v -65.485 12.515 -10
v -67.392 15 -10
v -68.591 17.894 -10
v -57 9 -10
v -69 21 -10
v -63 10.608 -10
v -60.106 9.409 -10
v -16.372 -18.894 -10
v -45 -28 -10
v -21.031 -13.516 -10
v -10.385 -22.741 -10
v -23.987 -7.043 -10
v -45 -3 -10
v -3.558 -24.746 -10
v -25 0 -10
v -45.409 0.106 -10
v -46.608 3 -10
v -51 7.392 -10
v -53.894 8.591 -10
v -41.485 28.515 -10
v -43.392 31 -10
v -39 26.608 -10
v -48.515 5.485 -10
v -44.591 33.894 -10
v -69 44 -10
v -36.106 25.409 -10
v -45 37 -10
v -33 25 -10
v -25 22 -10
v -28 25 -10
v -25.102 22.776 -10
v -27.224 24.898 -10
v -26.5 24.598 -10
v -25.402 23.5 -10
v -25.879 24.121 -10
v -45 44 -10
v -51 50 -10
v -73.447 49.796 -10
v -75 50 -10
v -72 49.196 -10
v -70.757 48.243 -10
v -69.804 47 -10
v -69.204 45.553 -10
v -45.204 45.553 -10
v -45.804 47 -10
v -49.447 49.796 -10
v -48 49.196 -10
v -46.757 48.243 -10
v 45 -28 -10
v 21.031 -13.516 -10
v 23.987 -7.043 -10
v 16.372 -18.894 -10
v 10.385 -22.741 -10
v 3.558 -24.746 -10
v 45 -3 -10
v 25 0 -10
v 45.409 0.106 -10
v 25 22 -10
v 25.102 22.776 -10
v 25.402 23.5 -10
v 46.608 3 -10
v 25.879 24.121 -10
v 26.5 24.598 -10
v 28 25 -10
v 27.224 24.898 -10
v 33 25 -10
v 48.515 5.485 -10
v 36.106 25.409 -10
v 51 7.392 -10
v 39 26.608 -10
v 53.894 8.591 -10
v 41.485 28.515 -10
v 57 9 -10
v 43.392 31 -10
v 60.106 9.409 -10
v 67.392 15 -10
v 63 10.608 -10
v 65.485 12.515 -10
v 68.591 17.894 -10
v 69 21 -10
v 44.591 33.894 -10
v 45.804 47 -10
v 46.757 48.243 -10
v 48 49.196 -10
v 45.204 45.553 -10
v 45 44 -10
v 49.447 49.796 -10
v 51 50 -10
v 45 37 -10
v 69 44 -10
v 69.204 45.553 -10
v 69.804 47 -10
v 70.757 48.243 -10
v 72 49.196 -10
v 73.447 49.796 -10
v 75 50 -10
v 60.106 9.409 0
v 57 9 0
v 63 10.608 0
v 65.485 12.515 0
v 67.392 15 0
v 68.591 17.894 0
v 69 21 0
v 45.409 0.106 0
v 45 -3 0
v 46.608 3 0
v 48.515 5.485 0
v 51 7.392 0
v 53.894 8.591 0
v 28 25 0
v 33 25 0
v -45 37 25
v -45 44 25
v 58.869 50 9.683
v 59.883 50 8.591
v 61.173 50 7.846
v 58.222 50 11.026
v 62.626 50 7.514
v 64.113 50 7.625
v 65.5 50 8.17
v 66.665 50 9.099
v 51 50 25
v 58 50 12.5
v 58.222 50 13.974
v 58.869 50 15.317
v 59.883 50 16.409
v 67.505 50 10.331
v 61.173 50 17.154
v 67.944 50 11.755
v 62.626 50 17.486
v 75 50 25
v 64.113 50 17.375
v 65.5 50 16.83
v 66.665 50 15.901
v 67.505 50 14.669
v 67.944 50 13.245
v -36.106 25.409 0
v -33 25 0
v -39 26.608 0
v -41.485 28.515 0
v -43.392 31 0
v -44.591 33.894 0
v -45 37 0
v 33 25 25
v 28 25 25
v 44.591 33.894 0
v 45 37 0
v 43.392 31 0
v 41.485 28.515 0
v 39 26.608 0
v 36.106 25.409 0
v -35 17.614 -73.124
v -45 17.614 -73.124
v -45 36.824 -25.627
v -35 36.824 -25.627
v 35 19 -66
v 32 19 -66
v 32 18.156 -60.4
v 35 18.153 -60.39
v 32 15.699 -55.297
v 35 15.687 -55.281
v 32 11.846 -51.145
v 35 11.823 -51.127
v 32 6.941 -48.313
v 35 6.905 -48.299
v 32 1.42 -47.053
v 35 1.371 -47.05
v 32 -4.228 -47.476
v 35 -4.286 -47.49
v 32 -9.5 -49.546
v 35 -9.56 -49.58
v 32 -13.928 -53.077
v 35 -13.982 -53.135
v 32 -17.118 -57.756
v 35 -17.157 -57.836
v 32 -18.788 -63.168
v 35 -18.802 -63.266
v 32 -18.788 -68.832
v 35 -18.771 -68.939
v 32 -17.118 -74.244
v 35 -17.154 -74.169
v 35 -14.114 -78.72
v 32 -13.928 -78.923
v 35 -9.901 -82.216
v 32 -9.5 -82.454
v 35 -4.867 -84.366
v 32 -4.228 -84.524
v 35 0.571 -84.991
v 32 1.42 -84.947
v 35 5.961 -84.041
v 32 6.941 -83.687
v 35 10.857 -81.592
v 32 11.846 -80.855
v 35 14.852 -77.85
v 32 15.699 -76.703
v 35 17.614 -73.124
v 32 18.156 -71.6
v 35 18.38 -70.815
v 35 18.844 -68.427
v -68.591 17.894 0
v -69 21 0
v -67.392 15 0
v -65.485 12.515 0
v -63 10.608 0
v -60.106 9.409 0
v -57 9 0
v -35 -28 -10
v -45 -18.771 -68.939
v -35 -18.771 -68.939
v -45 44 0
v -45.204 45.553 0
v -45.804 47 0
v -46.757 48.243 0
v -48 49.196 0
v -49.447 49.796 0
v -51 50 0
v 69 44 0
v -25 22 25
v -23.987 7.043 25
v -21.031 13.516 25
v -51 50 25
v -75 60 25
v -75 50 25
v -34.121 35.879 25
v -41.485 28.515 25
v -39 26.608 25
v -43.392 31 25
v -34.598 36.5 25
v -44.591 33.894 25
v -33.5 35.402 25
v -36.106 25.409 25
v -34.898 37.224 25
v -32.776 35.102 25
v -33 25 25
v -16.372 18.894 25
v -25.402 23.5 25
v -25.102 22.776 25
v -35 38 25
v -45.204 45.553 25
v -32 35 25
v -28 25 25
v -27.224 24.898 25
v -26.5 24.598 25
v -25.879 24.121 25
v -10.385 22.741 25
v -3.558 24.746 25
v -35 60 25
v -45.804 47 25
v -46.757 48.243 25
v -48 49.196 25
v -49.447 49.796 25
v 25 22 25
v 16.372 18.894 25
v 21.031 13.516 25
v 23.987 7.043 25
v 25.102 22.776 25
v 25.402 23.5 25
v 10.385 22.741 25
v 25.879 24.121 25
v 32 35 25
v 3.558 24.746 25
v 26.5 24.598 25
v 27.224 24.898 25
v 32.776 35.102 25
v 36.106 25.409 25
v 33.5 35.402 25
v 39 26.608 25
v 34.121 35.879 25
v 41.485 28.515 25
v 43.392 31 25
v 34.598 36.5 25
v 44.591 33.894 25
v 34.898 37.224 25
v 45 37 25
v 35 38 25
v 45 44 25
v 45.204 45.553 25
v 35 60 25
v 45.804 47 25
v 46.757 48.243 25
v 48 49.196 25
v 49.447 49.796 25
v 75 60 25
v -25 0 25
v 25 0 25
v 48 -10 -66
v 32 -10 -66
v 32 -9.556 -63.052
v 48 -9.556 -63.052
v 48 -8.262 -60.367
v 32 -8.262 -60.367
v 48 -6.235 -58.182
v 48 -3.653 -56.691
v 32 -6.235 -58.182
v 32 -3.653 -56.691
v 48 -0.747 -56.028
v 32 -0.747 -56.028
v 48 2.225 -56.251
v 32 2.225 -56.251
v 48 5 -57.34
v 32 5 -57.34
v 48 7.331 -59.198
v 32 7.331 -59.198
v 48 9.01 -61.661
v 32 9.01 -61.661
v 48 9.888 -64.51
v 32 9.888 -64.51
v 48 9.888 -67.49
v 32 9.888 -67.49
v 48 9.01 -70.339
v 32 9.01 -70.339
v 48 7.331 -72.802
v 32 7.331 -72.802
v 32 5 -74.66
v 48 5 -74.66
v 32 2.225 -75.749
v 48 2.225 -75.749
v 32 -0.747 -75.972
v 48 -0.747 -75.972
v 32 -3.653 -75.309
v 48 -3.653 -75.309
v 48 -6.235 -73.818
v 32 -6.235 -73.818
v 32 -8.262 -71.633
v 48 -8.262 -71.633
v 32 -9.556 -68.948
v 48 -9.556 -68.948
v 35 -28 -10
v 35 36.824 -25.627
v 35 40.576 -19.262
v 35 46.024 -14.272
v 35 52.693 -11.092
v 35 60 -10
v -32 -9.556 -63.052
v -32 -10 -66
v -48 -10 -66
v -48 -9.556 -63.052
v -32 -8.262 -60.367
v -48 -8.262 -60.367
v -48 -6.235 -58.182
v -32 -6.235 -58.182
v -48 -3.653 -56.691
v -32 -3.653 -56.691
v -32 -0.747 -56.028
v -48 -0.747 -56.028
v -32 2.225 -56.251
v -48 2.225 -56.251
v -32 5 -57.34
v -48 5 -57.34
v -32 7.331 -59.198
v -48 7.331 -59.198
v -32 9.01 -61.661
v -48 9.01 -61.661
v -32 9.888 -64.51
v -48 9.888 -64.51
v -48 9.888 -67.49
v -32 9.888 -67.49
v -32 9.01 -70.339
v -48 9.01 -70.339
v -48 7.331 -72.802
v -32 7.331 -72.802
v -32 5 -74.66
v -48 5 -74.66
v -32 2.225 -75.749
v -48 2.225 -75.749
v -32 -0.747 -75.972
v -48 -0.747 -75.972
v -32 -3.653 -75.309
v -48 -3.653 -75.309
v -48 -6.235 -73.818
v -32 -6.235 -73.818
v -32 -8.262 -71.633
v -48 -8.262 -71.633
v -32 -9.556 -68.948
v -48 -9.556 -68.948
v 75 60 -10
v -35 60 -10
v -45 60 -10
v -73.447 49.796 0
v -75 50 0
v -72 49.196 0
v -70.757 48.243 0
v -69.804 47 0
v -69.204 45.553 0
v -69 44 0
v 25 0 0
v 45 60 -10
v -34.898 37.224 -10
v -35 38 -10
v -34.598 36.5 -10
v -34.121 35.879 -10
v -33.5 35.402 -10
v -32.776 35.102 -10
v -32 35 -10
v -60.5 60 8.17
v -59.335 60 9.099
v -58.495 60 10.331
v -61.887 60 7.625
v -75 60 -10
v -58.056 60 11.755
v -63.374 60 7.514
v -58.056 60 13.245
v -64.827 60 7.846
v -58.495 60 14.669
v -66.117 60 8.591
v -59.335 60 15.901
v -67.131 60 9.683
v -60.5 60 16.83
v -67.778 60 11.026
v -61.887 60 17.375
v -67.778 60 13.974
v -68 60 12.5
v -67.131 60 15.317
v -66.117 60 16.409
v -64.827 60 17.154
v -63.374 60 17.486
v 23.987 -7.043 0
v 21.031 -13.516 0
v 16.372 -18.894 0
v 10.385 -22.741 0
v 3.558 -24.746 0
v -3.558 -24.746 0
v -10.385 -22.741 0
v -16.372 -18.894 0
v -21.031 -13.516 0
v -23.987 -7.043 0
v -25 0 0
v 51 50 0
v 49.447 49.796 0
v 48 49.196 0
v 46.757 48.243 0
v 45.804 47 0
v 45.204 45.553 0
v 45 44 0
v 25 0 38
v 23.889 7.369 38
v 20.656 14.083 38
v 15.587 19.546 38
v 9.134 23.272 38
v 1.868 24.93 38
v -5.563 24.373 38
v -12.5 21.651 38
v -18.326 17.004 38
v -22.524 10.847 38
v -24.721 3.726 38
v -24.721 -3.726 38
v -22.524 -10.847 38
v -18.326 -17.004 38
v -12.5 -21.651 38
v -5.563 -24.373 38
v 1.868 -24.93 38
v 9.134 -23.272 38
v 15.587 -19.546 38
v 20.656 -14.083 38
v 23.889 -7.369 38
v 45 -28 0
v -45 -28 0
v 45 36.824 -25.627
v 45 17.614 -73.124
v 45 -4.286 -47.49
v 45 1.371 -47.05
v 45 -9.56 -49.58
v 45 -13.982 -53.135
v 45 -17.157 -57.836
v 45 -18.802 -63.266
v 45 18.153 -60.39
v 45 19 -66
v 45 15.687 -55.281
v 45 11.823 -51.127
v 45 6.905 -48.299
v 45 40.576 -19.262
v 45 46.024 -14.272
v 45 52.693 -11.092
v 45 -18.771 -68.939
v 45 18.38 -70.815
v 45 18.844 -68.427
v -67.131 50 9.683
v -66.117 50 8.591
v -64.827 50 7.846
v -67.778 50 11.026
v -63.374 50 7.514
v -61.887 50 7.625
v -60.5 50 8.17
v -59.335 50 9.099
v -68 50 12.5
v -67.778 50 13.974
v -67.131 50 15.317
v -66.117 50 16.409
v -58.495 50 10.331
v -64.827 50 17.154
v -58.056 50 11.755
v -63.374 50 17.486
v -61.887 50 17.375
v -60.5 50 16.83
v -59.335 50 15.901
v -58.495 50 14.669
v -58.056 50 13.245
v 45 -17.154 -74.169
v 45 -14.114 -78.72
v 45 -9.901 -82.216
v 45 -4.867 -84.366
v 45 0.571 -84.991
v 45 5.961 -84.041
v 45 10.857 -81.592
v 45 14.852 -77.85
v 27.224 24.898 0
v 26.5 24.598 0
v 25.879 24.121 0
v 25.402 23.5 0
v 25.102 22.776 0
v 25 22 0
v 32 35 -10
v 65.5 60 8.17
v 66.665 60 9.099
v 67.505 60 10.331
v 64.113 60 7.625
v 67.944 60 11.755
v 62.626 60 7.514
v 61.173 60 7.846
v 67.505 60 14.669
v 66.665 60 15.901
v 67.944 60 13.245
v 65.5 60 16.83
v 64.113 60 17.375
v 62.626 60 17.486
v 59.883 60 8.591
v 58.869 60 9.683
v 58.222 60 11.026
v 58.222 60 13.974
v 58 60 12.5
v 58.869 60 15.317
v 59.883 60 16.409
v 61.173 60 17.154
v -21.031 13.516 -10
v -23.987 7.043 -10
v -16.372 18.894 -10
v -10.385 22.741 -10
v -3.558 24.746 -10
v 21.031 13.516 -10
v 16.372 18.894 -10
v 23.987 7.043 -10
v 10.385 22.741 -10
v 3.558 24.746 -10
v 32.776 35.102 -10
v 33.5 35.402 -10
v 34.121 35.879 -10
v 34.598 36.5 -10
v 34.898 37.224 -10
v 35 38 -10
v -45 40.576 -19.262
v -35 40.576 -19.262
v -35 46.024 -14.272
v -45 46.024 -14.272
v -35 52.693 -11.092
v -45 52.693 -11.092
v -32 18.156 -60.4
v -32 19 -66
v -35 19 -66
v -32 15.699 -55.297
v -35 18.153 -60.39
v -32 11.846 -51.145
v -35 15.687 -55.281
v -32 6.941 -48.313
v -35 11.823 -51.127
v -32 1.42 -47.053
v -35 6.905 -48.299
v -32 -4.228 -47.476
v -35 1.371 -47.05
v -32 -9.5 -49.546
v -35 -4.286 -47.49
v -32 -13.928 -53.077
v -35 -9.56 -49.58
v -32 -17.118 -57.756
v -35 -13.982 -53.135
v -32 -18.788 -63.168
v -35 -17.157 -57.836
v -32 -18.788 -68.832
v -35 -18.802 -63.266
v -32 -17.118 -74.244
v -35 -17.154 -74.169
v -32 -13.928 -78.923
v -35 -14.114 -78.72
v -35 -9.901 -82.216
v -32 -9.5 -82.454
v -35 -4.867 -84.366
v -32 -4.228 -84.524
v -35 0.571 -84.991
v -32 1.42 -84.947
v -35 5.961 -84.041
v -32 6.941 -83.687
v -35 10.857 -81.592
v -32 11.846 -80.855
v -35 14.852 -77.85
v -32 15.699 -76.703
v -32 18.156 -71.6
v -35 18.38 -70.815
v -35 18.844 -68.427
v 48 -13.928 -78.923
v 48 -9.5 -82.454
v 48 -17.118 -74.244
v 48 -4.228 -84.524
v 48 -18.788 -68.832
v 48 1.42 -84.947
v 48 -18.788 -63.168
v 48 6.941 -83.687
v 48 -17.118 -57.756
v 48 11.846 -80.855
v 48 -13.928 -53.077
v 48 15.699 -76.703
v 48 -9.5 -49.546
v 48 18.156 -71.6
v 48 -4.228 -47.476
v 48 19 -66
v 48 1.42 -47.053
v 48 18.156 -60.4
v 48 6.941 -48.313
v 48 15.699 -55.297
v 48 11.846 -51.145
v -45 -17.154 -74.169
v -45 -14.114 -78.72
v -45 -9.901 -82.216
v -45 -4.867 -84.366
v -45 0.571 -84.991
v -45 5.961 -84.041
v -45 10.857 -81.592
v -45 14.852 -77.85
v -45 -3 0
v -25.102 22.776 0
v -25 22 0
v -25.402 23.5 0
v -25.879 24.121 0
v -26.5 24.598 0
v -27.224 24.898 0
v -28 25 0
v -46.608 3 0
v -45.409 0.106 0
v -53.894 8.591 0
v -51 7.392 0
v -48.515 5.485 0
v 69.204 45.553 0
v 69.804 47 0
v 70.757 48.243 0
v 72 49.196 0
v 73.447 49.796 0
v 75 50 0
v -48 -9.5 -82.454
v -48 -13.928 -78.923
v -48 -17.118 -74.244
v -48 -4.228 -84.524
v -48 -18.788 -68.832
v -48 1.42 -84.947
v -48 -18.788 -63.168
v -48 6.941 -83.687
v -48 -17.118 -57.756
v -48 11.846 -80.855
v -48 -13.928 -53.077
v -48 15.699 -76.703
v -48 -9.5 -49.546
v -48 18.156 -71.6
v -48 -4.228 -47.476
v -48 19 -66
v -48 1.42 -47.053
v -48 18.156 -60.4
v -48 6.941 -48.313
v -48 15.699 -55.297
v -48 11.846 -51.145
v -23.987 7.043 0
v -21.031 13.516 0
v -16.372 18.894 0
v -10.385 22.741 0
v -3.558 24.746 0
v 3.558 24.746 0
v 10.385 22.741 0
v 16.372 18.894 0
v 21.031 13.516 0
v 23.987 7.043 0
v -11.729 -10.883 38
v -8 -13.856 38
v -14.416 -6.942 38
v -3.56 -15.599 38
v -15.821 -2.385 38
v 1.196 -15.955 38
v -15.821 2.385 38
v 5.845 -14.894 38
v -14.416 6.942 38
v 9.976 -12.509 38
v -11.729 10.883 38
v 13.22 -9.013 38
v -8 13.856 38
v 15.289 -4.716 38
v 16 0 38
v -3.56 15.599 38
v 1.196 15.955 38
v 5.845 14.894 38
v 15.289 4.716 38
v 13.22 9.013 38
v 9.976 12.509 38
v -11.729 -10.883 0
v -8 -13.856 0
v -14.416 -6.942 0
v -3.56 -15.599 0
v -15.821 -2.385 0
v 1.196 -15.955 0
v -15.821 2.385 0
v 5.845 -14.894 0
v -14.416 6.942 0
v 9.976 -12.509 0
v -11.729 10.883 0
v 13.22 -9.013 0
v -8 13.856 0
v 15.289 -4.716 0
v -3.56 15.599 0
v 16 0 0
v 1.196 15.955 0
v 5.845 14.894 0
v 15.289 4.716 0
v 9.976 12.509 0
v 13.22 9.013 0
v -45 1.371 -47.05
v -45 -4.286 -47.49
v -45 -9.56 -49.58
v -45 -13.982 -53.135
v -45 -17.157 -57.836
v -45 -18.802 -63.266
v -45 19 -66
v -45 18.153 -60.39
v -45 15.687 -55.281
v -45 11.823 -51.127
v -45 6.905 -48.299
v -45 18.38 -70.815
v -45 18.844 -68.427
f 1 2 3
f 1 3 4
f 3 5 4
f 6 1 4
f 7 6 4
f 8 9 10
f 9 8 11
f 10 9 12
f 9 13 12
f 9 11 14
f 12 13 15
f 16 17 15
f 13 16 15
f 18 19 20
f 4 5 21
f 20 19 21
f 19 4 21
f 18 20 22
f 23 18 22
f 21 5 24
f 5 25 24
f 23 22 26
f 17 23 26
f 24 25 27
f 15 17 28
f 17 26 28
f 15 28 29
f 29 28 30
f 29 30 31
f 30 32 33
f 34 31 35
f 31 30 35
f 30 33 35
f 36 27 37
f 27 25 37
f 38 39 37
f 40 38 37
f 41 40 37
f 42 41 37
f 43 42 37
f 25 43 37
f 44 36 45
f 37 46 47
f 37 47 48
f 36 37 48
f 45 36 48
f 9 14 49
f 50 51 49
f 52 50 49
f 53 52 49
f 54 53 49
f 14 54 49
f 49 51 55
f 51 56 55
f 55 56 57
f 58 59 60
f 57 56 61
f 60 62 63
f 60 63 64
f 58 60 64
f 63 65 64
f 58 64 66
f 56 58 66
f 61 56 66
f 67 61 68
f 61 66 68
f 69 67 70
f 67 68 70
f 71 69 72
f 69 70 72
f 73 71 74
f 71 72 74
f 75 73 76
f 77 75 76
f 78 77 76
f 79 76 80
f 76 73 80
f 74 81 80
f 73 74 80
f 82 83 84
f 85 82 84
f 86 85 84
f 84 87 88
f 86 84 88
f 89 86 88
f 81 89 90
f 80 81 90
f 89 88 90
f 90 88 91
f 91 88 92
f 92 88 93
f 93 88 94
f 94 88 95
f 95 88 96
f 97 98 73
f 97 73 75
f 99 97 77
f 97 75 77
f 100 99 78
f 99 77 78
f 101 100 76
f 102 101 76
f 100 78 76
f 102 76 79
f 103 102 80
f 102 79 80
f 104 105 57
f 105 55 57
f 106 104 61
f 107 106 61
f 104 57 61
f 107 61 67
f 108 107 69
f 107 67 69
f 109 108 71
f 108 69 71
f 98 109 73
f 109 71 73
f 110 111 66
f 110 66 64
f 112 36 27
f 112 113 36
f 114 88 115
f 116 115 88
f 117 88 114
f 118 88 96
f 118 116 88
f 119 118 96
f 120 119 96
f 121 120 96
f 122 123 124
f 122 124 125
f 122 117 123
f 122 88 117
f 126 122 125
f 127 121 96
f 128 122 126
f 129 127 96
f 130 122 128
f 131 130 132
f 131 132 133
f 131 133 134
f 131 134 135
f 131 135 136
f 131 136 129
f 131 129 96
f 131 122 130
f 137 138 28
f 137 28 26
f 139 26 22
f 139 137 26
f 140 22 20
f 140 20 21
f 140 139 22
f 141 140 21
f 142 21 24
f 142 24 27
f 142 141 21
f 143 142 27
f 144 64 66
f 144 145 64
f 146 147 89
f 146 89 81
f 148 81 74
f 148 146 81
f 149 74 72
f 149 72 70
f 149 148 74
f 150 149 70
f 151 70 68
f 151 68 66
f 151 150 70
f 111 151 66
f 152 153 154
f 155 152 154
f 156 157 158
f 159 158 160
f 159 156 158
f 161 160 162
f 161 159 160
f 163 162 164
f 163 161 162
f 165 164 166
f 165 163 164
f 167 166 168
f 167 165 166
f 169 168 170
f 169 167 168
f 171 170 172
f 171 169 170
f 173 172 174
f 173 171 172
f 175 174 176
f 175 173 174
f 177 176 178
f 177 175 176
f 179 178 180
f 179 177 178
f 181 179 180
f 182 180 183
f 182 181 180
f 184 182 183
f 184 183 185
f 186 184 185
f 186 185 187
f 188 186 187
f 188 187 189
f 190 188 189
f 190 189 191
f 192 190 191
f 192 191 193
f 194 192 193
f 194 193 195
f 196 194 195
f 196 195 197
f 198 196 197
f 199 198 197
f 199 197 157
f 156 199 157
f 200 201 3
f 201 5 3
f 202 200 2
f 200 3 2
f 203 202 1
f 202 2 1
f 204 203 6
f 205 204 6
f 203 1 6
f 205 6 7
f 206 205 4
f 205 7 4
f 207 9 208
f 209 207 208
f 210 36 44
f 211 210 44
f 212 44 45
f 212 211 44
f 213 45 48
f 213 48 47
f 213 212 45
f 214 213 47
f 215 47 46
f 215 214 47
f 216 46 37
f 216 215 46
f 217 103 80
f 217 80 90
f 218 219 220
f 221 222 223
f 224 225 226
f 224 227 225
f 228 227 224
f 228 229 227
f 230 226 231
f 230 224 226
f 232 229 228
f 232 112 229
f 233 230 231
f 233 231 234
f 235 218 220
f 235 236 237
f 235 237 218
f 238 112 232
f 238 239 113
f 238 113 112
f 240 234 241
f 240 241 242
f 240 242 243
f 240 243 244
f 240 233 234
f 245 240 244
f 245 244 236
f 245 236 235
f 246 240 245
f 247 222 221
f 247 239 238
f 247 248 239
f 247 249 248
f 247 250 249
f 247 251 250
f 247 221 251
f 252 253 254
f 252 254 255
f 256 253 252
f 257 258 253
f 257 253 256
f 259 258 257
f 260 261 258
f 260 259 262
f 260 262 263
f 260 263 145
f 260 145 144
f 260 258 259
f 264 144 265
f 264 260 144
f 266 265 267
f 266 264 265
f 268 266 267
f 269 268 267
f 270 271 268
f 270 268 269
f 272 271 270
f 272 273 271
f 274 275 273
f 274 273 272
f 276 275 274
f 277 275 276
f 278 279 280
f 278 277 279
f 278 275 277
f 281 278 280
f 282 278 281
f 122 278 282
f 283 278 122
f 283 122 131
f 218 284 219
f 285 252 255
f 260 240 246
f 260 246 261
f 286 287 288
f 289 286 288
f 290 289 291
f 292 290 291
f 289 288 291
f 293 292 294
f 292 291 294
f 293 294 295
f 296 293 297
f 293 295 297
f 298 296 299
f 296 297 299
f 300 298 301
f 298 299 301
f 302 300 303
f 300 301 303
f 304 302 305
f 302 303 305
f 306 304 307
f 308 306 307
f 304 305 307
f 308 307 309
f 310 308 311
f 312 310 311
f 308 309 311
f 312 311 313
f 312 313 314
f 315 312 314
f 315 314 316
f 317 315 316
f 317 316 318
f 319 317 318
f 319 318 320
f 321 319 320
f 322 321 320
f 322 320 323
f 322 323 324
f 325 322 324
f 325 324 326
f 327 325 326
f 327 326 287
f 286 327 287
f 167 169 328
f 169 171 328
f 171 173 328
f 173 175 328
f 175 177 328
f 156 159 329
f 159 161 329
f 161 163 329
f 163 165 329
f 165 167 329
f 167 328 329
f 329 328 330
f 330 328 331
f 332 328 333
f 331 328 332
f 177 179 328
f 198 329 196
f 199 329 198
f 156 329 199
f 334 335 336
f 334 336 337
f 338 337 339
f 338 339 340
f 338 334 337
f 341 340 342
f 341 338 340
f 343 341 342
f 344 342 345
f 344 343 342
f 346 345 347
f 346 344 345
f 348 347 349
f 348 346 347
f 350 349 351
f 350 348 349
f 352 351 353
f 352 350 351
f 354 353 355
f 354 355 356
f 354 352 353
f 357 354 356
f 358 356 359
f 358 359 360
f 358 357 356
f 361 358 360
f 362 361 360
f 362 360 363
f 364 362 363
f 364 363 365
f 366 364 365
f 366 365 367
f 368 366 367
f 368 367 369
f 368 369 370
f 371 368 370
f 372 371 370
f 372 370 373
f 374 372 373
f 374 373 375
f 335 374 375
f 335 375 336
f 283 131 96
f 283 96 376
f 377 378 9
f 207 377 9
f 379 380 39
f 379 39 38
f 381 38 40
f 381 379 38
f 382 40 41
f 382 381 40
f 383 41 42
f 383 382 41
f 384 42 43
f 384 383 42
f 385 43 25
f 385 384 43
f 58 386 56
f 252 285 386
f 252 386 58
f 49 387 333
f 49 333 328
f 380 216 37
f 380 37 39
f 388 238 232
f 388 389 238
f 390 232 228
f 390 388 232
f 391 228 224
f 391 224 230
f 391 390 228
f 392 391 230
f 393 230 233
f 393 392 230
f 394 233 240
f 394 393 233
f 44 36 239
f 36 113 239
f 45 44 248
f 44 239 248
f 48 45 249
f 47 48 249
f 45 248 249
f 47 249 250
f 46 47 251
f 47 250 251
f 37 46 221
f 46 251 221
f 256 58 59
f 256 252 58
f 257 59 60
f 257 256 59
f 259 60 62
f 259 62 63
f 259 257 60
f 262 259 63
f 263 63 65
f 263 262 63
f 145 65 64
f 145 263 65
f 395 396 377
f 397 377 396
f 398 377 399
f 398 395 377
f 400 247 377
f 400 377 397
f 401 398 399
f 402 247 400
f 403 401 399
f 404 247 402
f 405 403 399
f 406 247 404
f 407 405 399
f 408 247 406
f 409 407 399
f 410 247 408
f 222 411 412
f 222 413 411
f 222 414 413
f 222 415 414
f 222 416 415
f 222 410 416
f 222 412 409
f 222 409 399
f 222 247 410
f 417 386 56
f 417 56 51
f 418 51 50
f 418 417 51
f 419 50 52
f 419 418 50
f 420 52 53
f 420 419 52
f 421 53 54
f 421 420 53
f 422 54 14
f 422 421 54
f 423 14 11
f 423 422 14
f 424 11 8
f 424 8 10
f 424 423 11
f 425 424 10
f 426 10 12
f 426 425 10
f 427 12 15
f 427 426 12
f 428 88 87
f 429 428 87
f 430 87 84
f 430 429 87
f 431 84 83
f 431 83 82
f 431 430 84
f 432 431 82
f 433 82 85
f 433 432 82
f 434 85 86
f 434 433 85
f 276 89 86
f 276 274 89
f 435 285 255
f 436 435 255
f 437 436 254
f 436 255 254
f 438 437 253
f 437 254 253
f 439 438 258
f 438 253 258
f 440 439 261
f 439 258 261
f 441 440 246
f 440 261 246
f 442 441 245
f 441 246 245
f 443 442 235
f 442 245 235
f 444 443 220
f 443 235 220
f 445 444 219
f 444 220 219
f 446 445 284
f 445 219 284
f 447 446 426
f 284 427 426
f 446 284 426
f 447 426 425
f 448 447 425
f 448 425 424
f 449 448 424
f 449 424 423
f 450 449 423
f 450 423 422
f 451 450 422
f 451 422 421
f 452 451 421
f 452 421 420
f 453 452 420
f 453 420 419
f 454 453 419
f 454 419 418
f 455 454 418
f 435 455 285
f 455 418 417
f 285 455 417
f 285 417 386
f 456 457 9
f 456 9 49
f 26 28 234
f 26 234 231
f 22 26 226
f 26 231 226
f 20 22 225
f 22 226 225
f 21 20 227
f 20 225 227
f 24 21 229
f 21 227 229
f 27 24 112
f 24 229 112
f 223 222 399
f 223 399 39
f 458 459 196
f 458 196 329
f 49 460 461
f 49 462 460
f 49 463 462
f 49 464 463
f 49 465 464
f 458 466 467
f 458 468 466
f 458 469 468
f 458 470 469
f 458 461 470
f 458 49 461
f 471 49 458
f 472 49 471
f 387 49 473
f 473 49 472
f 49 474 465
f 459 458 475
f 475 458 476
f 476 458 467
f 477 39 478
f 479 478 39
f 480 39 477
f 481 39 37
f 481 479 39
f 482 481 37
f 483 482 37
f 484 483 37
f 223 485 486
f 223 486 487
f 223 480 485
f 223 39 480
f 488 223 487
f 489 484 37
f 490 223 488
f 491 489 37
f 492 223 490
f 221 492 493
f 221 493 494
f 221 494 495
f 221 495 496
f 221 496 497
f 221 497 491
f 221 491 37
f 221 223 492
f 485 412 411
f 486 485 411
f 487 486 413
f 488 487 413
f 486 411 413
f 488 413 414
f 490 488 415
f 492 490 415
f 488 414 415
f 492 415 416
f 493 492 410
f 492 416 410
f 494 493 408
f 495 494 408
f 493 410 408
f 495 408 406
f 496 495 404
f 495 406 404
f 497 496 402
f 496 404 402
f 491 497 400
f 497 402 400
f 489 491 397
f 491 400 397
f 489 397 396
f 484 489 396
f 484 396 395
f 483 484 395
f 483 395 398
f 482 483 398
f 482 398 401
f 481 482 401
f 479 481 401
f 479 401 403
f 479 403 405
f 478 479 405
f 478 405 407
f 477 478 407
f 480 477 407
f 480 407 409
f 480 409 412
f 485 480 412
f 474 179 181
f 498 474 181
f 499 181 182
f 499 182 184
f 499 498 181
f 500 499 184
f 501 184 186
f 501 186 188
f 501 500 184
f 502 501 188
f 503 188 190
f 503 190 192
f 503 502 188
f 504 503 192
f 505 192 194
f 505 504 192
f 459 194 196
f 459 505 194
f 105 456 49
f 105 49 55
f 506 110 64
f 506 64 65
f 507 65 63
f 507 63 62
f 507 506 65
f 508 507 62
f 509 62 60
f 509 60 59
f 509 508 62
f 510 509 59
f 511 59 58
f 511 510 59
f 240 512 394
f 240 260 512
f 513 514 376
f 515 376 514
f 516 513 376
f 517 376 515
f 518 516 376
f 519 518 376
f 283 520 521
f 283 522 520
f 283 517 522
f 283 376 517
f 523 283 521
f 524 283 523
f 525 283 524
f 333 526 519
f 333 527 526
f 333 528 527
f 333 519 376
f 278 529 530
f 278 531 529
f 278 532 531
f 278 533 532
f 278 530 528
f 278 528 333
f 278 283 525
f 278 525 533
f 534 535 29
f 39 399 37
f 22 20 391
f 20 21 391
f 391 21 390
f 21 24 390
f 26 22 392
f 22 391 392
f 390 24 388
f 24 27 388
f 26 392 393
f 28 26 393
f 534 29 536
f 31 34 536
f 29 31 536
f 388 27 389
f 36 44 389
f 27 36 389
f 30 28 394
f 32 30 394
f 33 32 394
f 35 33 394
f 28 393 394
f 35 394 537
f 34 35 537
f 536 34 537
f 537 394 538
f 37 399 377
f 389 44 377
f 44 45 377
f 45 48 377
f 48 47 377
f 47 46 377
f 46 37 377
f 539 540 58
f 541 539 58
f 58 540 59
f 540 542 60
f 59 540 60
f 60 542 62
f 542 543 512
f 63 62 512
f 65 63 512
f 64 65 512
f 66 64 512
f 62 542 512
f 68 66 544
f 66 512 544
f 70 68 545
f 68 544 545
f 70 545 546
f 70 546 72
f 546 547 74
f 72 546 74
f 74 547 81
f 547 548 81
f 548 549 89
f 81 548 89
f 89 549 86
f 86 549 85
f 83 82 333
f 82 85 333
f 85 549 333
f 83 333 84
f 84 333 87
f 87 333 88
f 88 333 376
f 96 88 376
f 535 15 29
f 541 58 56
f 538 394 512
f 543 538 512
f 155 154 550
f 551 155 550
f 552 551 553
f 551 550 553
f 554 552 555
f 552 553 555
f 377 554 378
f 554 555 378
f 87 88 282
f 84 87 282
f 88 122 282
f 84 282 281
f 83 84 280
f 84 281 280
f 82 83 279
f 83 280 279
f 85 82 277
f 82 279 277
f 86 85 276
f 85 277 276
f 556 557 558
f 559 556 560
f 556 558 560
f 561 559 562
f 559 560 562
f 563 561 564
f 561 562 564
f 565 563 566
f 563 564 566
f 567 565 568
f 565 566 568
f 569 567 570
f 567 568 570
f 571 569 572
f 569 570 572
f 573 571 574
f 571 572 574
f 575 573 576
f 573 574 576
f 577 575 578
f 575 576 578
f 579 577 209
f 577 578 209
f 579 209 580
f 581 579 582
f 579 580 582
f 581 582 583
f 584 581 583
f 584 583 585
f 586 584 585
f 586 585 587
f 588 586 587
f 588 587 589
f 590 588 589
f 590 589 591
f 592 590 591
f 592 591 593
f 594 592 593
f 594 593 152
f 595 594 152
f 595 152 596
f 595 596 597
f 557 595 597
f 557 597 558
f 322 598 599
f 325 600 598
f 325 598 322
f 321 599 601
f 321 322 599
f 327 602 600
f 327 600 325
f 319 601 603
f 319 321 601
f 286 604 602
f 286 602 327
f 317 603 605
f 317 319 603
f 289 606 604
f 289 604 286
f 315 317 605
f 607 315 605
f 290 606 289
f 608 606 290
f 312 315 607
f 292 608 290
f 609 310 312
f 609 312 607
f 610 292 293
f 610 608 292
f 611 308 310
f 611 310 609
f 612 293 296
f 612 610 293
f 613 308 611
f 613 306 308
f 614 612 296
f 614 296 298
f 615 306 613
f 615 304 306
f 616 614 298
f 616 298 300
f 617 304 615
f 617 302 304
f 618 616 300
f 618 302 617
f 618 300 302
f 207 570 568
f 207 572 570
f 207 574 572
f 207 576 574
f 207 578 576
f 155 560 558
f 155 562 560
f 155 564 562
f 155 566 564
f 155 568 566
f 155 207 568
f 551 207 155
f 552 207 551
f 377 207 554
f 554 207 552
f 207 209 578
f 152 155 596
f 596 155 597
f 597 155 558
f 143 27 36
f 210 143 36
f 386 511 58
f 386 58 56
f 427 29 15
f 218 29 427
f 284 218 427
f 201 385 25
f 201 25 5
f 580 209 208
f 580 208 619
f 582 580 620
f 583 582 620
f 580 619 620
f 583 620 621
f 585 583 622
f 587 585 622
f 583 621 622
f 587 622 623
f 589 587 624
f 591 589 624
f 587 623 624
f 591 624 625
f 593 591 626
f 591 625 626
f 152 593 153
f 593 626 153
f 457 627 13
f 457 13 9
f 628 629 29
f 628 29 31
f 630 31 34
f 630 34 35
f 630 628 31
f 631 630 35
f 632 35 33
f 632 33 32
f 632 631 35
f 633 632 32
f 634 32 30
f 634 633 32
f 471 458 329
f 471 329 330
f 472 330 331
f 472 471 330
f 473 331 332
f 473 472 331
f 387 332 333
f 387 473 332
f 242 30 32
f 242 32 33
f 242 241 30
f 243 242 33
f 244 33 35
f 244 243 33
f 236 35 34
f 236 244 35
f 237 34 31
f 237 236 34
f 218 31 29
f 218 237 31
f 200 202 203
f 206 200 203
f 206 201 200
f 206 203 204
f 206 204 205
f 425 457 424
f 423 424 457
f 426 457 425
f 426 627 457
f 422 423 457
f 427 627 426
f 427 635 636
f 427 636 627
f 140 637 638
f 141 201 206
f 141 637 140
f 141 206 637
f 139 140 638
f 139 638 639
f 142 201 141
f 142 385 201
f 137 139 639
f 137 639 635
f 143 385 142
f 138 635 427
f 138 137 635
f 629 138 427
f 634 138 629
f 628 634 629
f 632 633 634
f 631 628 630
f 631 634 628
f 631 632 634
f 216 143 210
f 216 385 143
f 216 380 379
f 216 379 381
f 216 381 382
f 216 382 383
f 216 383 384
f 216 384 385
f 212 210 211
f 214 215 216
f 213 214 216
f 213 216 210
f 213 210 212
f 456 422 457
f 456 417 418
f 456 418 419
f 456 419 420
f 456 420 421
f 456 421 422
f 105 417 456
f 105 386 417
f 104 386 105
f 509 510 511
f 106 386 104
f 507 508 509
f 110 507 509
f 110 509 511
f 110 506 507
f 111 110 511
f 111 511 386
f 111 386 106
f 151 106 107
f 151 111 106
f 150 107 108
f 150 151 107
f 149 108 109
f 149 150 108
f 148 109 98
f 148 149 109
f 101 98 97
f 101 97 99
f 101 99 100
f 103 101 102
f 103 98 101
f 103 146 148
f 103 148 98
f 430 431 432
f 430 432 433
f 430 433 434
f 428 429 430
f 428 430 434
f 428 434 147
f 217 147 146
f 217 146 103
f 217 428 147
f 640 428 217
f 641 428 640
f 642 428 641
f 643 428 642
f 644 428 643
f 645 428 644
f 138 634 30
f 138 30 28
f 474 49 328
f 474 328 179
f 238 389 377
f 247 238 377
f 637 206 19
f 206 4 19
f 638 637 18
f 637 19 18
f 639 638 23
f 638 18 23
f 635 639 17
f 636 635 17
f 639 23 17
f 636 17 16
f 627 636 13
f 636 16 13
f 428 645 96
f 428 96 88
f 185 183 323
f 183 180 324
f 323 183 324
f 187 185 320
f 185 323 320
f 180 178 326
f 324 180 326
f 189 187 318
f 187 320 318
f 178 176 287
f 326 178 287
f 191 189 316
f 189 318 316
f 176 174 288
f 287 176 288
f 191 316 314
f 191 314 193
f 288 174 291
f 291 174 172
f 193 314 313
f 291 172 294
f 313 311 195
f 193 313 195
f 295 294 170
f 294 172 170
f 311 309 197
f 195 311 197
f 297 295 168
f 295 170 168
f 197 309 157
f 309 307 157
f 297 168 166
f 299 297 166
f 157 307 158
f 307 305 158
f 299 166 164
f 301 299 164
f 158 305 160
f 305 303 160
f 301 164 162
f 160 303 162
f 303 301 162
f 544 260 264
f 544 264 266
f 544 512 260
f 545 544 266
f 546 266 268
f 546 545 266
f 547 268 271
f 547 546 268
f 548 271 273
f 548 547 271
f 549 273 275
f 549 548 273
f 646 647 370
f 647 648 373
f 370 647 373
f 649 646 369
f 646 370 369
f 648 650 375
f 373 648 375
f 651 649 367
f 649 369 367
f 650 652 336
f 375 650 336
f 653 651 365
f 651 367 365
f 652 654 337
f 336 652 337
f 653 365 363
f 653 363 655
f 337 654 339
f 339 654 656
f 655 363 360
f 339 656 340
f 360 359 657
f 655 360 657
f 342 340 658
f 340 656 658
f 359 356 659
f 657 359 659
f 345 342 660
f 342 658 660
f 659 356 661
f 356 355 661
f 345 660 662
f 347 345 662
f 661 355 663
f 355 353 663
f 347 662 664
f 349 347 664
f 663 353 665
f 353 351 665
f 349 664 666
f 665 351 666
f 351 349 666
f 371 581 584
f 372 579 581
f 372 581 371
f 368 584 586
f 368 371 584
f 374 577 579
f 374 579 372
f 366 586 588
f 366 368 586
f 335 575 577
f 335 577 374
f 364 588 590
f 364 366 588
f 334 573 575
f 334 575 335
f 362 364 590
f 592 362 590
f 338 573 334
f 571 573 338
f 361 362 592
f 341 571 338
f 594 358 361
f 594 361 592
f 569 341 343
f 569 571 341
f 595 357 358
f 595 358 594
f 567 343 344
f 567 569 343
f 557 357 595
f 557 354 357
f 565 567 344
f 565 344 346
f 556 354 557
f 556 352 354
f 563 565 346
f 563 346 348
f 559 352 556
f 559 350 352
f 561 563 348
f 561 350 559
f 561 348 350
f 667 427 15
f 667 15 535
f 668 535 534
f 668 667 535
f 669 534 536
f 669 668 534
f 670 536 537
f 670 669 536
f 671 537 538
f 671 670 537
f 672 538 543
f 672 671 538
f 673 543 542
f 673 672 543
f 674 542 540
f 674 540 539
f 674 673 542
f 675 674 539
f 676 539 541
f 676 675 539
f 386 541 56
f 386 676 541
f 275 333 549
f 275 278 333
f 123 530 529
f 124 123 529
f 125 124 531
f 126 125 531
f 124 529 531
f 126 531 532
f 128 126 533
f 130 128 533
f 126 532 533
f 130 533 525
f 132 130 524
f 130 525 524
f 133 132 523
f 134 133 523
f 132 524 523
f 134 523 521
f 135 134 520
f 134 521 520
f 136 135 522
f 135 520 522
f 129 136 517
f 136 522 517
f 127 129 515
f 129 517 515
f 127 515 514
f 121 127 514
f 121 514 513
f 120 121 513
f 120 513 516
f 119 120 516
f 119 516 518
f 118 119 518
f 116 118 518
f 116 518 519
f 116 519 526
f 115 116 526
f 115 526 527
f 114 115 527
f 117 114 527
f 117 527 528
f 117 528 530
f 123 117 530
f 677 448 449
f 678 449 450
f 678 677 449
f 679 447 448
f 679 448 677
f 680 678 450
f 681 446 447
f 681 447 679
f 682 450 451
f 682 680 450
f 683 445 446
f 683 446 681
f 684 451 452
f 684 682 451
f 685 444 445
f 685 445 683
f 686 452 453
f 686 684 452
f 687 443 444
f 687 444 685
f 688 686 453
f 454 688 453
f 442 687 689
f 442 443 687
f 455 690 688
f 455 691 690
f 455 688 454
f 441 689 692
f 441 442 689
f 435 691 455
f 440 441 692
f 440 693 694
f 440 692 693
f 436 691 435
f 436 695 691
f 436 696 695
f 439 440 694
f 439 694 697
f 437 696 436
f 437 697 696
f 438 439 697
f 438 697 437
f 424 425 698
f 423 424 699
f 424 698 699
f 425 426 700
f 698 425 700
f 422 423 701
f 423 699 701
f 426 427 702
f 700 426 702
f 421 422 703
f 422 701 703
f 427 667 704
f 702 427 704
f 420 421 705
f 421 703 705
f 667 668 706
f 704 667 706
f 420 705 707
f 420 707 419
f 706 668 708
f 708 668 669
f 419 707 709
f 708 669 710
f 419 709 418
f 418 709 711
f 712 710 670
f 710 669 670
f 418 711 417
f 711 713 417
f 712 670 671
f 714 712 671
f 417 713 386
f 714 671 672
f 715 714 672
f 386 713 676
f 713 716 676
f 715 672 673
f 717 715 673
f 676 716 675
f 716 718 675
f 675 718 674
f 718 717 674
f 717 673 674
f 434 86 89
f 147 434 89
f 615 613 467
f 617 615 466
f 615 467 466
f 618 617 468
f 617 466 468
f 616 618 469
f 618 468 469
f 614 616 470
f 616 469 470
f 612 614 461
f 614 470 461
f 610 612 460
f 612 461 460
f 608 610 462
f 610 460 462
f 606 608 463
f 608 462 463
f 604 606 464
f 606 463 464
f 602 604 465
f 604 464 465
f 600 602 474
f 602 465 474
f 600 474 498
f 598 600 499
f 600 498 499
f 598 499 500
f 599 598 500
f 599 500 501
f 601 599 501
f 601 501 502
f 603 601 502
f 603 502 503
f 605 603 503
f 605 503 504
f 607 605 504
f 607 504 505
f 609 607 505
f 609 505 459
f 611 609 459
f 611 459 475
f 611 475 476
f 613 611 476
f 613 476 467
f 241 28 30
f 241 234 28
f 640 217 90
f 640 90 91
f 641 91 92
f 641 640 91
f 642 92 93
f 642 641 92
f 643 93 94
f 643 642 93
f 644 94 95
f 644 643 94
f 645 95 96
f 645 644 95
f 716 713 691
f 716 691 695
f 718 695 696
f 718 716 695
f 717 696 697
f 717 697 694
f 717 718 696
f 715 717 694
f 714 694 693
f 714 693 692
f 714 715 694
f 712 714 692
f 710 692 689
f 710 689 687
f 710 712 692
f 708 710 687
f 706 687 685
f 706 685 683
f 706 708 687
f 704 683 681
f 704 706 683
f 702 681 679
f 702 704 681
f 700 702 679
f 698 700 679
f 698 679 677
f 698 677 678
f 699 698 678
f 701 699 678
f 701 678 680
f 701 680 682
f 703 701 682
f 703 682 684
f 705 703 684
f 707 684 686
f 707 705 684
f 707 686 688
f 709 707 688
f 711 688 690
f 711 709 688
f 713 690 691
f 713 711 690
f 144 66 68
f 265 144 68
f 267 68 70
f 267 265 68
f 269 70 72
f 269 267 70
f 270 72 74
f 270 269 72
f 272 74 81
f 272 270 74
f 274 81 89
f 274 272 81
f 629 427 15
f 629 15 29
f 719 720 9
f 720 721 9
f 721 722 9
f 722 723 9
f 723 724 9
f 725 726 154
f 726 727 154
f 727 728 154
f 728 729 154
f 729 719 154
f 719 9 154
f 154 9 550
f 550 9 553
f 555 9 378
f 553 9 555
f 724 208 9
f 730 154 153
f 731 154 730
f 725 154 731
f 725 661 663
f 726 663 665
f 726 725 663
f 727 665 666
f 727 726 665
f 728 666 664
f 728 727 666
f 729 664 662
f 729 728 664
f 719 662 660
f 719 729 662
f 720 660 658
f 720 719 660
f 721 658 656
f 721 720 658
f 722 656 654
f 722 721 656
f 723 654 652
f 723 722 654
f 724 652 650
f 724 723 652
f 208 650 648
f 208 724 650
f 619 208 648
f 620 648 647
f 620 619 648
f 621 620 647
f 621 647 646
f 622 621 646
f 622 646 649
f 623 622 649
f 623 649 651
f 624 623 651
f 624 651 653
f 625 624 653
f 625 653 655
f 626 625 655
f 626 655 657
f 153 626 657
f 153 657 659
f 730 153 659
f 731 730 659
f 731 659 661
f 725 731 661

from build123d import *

# Parameters (mm, degrees)
F0_R          = 25
F0_R_2        = 16
F1_DEPTH      = 38
F3_DEPTH      = 25
F3_DEPTH_BACK = 10
F4_R          = 6
F5_R          = 3
F6_R          = 12
F8_DEPTH      = 10
F9_R          = 11.99999
F11_DEPTH     = 10
F12_R         = 19
F13_DEPTH     = 3
F17_D         = 20
F17_DEPTH     = 25
F17_TIP       = 6.0086061903
F20_D         = 10
F20_DEPTH     = 25
F20_TIP       = 3.0043030951


# Not quite as in the source:
# - a fillet or chamfer is up to 0.001 mm smaller than in the source, because OpenCascade refuses the exact size


with BuildPart() as f1:
    # F0 (on Top) → F1 (new body)
    with BuildSketch(Plane.XY):
        Circle(F0_R)
        Circle(F0_R_2, mode=Mode.SUBTRACT)
    extrude(amount=F1_DEPTH)

    # F2 (on Top) → F3 (join, two sides)
    with BuildSketch(Plane.XY) as f3_sk:
        with BuildLine():
            Line((-35, 60), (-75, 60))
            Line((-75, 60), (-75, 50))
            Line((-75, 50), (-45, 50))
            Line((-45, 50), (-45, 25))
            Line((-45, 25), (-25, 25))
            Line((-25, 25), (-25, 0))
            ThreePointArc((-25, 0), (0, 25), (25, 0))
            Line((25, 0), (25, 25))
            Line((25, 25), (45, 25))
            Line((45, 25), (45, 50))
            Line((45, 50), (75, 50))
            Line((75, 50), (75, 60))
            Line((75, 60), (35, 60))
            Line((35, 60), (35, 35))
            Line((35, 35), (0, 35))
            Line((0, 35), (-35, 35))
            Line((-35, 35), (-35, 60))
        make_face()
    extrude(amount=F3_DEPTH)
    extrude(f3_sk.sketch, amount=-F3_DEPTH_BACK)

    # F4
    f4_edges = [f1.edges().sort_by_distance(p)[0] for p in [
        (45, 50, 7.5),
        (-45, 50, 7.5),
    ]]
    fillet(f4_edges, radius=F4_R)

    # F5
    f5_edges = [f1.edges().sort_by_distance(p)[0] for p in [
        (25, 25, 7.5),
        (-25, 25, 7.5),
        (-35, 35, 7.5),
        (35, 35, 7.5),
    ]]
    fillet(f5_edges, radius=F5_R)

    # F6
    f6_edges = [f1.edges().sort_by_distance(p)[0] for p in [
        (-45, 25, 7.5),
        (45, 25, 7.5),
    ]]
    fillet(f6_edges, radius=F6_R)

    # F20
    with Locations(Plane.XZ.offset(-50)):
        with Locations((-63, 12.5), (63, 12.5)):
            Hole(F20_D / 2, depth=F20_DEPTH)
            with Locations((0, 0, -(F20_DEPTH + F20_TIP / 2))):  # 118° drill point
                Cone(0, F20_D / 2, F20_TIP, mode=Mode.SUBTRACT)


with BuildPart() as f8:
    # F7 (on Top) → F8 (new body)
    with BuildSketch(Plane.XY):
        with BuildLine():
            Line((-45, -28), (0, -28))
            Line((0, -28), (45, -28))
            Line((45, -28), (45, 9))
            Line((45, 9), (69, 9))
            Line((69, 9), (69, 44))
            ThreePointArc((69, 44), (70.7573593129, 48.2426406871), (75, 50))
            Line((75, 50), (51, 50))
            ThreePointArc((51, 50), (46.7573593129, 48.2426406871), (45, 44))
            Line((45, 44), (45, 37))
            ThreePointArc((45, 37), (41.4852813742, 28.5147186258), (33, 25))
            Line((33, 25), (28, 25))
            ThreePointArc((28, 25), (25.8786796564, 24.1213203436), (25, 22))
            Line((25, 22), (25, 0))
            ThreePointArc((25, 0), (0, -25), (-25, 0))
            Line((-25, 0), (-25, 22))
            ThreePointArc((-25, 22), (-25.8786796564, 24.1213203436), (-28, 25))
            Line((-28, 25), (-33, 25))
            ThreePointArc((-33, 25), (-41.4852813742, 28.5147186258), (-45, 37))
            Line((-45, 37), (-45, 44))
            ThreePointArc((-45, 44), (-46.7573593129, 48.2426406871), (-51, 50))
            Line((-51, 50), (-75, 50))
            ThreePointArc((-75, 50), (-70.7573593129, 48.2426406871), (-69, 44))
            Line((-69, 44), (-69, 9))
            Line((-69, 9), (-45, 9))
            Line((-45, 9), (-45, -28))
        make_face()
    extrude(amount=-F8_DEPTH)

    # F9 (radius 12 in the source; OpenCascade refuses exactly that, so slightly less here)
    f9_edges = [f8.edges().sort_by_distance(p)[0] for p in [
        (-69, 9, -5),
        (-45, 9, -5),
        (45, 9, -5),
        (69, 9, -5),
    ]]
    fillet(f9_edges, radius=F9_R)


with BuildPart() as f11:
    # F10 (on face) → F11 (new body)
    with BuildSketch(Plane.YZ.offset(45)):
        with BuildLine():
            Line((-28, -10), (-18.7712820587, -68.9392124579))
            ThreePointArc((-18.7712820587, -68.9392124579), (-2.1708355833, -84.8755787427), (17.6139596592, -73.1237928888))
            Line((17.6139596592, -73.1237928888), (36.8237372905, -25.6265883042))
            ThreePointArc((36.8237372905, -25.6265883042), (46.0238648475, -14.2715739575), (60, -10))
            Line((60, -10), (50, -10))
            Line((50, -10), (44, -10))
            Line((44, -10), (21, -10))
            Line((21, -10), (9, -10))
            Line((9, -10), (-3, -10))
            Line((-3, -10), (-28, -10))
        make_face()
    extrude(amount=-F11_DEPTH)

    # F12 (on face) → F13 (join)
    with BuildSketch(Plane.YZ.offset(45)):
        with Locations((0, -66)):
            Circle(F12_R)
    extrude(amount=F13_DEPTH)

    # F15: F11 across plane


with BuildPart() as f11_1:
    add(f11.part)
    add(f11.part.mirror(Plane(origin=(40, 0, -66), x_dir=(0, 1, 0), z_dir=(1, 0, 0))))

    # F17
    with Locations(Plane.YZ.offset(48)):
        with Locations((0, -66)):
            Hole(F17_D / 2, depth=F17_DEPTH)
            with Locations((0, 0, -(F17_DEPTH + F17_TIP / 2))):  # 118° drill point
                Cone(0, F17_D / 2, F17_TIP, mode=Mode.SUBTRACT)


with BuildPart() as f18_1:
    # F18: instance of F11
    add(f11_1.part.mirror(Plane.YZ))


solid = Compound([f1.part, f8.part, f11_1.part, f18_1.part])
